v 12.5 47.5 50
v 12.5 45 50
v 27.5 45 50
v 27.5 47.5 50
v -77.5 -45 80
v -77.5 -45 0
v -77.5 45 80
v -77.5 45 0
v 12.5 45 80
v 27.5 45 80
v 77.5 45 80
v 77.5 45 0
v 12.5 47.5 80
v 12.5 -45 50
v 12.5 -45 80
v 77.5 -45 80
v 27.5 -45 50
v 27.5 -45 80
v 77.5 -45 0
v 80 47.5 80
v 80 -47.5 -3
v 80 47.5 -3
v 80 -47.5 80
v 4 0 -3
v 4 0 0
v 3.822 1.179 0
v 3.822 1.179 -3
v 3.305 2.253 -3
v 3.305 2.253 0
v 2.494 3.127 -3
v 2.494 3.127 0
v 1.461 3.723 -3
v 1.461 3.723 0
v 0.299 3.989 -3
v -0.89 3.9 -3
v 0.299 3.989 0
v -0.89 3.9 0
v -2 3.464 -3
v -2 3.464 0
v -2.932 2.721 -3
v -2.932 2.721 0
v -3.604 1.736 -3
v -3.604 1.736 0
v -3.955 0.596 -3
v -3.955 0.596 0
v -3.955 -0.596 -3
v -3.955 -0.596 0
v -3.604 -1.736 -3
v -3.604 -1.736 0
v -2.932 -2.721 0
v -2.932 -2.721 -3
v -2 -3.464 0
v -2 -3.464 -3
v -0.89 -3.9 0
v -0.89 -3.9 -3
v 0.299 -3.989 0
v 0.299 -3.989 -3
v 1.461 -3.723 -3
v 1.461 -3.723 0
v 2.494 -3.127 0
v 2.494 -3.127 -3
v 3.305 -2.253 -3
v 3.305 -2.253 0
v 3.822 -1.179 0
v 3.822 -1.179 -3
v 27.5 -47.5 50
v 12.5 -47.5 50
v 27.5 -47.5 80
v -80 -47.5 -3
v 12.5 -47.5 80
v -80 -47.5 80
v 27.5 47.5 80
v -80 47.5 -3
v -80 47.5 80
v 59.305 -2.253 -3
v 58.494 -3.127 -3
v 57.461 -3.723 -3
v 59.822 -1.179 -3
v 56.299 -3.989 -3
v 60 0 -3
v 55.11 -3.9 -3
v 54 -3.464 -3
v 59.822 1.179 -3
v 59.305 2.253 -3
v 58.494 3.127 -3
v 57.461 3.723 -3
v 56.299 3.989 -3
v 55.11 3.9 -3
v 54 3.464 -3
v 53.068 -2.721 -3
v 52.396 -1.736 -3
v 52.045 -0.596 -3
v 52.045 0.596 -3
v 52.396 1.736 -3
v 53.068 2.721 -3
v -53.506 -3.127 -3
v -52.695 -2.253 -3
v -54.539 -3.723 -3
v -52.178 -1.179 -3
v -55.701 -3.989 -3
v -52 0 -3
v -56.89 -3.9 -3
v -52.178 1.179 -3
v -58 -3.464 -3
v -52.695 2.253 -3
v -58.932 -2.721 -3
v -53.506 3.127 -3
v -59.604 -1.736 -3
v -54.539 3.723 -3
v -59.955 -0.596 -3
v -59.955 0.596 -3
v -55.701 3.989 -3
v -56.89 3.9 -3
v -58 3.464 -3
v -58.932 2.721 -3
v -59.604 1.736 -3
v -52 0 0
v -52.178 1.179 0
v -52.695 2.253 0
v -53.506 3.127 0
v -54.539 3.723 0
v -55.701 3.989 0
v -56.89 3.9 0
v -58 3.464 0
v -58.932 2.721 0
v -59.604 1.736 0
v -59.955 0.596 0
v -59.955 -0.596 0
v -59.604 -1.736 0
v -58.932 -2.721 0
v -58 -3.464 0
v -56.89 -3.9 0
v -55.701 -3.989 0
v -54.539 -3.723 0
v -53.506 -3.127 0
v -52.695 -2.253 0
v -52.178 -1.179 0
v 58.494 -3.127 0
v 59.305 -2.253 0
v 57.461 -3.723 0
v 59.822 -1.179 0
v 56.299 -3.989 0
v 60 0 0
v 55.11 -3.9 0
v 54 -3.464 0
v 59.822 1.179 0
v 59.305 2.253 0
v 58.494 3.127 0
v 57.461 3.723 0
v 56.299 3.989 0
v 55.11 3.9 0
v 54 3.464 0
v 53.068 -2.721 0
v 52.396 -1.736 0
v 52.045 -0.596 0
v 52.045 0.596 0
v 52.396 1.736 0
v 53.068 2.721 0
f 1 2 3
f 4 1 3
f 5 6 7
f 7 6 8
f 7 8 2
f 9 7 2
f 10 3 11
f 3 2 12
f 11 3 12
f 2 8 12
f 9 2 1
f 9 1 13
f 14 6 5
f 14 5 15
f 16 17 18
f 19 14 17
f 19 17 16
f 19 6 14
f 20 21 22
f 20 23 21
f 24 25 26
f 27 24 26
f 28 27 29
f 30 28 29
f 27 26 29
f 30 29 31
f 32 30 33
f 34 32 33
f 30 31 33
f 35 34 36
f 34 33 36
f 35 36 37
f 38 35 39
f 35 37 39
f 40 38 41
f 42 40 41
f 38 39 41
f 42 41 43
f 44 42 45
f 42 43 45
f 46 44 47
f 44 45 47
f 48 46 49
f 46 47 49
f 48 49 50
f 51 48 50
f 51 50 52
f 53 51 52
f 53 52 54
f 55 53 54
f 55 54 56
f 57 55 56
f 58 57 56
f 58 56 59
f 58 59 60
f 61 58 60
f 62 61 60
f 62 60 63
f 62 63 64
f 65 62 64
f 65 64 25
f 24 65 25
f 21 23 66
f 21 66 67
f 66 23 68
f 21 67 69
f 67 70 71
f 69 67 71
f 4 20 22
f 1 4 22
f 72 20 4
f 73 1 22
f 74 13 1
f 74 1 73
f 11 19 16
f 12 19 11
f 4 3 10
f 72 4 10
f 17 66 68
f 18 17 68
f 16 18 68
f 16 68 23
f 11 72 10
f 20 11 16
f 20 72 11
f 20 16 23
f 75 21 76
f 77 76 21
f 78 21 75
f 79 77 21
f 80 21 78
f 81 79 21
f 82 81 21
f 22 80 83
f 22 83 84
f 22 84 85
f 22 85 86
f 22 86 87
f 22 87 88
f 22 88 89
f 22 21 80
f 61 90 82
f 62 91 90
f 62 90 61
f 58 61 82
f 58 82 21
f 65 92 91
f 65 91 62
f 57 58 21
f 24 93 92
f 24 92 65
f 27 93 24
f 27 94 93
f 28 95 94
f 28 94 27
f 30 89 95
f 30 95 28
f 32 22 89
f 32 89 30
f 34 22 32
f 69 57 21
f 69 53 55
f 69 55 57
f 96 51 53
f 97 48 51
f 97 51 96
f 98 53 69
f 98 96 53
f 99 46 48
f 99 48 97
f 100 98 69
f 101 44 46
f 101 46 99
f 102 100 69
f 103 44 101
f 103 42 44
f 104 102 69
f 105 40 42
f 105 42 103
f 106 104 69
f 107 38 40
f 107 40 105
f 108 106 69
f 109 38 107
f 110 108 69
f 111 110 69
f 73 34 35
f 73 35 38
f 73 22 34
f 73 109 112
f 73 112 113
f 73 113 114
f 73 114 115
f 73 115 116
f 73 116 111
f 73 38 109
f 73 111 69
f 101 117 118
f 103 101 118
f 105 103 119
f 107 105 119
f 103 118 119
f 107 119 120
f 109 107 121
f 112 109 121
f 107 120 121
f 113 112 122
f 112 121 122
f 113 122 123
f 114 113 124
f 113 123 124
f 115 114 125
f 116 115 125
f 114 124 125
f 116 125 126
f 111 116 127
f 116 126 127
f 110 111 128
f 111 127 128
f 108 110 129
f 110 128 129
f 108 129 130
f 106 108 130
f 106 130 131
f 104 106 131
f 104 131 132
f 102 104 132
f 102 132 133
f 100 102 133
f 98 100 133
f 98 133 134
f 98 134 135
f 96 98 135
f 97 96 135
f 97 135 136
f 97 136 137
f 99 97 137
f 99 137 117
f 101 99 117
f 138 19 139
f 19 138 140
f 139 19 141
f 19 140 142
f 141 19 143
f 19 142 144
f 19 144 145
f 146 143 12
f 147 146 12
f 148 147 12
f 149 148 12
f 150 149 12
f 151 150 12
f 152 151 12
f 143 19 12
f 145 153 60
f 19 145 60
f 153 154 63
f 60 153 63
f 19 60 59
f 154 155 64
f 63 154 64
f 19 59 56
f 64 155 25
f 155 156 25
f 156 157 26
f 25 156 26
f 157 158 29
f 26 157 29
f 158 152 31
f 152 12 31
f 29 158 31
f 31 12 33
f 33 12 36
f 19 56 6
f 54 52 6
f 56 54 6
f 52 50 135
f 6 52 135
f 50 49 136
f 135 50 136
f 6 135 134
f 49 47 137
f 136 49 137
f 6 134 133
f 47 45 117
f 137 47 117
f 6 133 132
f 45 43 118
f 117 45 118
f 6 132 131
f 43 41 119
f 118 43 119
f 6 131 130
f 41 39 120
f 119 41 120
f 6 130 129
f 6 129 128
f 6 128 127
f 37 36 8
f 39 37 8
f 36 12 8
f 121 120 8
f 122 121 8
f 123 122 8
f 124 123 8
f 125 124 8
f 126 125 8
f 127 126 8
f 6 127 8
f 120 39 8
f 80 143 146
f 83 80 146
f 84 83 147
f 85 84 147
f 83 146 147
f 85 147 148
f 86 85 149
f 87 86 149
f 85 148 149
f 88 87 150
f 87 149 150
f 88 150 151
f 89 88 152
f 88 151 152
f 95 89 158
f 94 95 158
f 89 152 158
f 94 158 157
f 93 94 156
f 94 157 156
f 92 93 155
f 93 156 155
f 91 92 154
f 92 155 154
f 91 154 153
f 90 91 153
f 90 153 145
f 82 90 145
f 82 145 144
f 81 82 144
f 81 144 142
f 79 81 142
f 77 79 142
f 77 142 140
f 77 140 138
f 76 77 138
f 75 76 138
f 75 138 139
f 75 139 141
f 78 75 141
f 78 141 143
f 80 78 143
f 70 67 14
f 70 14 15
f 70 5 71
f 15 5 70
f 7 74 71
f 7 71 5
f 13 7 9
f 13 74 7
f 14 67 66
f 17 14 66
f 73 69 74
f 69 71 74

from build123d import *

# Parameters (mm, degrees)
SKETCH_1_W          = 160
SKETCH_1_H          = 95
SKETCH_1_W_2        = 155
SKETCH_1_H_2        = 90
EXTRUDE_1_DEPTH     = 80
SKETCH_3_W          = 160
SKETCH_3_H          = 95
EXTRUDE_2_DEPTH     = 3
SKETCH_4_R          = 4
CUT_EXTRUDE_1_DEPTH = 10
SKETCH_5_W          = 15
SKETCH_5_H          = 30
CUT_EXTRUDE_2_DEPTH = 148.732867027


with BuildPart() as part:
    # ｽｹｯﾁ1 → ﾎﾞｽ - 押し出し1 (new body)
    with BuildSketch(Plane.XY):
        Rectangle(SKETCH_1_W, SKETCH_1_H)
        Rectangle(SKETCH_1_W_2, SKETCH_1_H_2, mode=Mode.SUBTRACT)
    extrude(amount=EXTRUDE_1_DEPTH)

    # ｽｹｯﾁ3 → ﾎﾞｽ - 押し出し2 (add)
    with BuildSketch(Plane(origin=(0, 0, 0), x_dir=(-1, 0, 0), z_dir=(0, 0, -1))):
        Rectangle(SKETCH_3_W, SKETCH_3_H)
    extrude(amount=EXTRUDE_2_DEPTH)

    # ｽｹｯﾁ4 → ｶｯﾄ - 押し出し1 (cut)
    with BuildSketch(Plane.XY):
        Circle(SKETCH_4_R)
        with Locations((-56, 0)):
            Circle(SKETCH_4_R)
        with Locations((56, 0)):
            Circle(SKETCH_4_R)
    extrude(amount=-CUT_EXTRUDE_1_DEPTH, mode=Mode.SUBTRACT)

    # ｽｹｯﾁ5 → ｶｯﾄ - 押し出し2 (cut, through all)
    with BuildSketch(Plane.XZ.offset(47.5)):
        with Locations((20, 65)):
            Rectangle(SKETCH_5_W, SKETCH_5_H)
    extrude(amount=-CUT_EXTRUDE_2_DEPTH, mode=Mode.SUBTRACT)


solid = part.part
